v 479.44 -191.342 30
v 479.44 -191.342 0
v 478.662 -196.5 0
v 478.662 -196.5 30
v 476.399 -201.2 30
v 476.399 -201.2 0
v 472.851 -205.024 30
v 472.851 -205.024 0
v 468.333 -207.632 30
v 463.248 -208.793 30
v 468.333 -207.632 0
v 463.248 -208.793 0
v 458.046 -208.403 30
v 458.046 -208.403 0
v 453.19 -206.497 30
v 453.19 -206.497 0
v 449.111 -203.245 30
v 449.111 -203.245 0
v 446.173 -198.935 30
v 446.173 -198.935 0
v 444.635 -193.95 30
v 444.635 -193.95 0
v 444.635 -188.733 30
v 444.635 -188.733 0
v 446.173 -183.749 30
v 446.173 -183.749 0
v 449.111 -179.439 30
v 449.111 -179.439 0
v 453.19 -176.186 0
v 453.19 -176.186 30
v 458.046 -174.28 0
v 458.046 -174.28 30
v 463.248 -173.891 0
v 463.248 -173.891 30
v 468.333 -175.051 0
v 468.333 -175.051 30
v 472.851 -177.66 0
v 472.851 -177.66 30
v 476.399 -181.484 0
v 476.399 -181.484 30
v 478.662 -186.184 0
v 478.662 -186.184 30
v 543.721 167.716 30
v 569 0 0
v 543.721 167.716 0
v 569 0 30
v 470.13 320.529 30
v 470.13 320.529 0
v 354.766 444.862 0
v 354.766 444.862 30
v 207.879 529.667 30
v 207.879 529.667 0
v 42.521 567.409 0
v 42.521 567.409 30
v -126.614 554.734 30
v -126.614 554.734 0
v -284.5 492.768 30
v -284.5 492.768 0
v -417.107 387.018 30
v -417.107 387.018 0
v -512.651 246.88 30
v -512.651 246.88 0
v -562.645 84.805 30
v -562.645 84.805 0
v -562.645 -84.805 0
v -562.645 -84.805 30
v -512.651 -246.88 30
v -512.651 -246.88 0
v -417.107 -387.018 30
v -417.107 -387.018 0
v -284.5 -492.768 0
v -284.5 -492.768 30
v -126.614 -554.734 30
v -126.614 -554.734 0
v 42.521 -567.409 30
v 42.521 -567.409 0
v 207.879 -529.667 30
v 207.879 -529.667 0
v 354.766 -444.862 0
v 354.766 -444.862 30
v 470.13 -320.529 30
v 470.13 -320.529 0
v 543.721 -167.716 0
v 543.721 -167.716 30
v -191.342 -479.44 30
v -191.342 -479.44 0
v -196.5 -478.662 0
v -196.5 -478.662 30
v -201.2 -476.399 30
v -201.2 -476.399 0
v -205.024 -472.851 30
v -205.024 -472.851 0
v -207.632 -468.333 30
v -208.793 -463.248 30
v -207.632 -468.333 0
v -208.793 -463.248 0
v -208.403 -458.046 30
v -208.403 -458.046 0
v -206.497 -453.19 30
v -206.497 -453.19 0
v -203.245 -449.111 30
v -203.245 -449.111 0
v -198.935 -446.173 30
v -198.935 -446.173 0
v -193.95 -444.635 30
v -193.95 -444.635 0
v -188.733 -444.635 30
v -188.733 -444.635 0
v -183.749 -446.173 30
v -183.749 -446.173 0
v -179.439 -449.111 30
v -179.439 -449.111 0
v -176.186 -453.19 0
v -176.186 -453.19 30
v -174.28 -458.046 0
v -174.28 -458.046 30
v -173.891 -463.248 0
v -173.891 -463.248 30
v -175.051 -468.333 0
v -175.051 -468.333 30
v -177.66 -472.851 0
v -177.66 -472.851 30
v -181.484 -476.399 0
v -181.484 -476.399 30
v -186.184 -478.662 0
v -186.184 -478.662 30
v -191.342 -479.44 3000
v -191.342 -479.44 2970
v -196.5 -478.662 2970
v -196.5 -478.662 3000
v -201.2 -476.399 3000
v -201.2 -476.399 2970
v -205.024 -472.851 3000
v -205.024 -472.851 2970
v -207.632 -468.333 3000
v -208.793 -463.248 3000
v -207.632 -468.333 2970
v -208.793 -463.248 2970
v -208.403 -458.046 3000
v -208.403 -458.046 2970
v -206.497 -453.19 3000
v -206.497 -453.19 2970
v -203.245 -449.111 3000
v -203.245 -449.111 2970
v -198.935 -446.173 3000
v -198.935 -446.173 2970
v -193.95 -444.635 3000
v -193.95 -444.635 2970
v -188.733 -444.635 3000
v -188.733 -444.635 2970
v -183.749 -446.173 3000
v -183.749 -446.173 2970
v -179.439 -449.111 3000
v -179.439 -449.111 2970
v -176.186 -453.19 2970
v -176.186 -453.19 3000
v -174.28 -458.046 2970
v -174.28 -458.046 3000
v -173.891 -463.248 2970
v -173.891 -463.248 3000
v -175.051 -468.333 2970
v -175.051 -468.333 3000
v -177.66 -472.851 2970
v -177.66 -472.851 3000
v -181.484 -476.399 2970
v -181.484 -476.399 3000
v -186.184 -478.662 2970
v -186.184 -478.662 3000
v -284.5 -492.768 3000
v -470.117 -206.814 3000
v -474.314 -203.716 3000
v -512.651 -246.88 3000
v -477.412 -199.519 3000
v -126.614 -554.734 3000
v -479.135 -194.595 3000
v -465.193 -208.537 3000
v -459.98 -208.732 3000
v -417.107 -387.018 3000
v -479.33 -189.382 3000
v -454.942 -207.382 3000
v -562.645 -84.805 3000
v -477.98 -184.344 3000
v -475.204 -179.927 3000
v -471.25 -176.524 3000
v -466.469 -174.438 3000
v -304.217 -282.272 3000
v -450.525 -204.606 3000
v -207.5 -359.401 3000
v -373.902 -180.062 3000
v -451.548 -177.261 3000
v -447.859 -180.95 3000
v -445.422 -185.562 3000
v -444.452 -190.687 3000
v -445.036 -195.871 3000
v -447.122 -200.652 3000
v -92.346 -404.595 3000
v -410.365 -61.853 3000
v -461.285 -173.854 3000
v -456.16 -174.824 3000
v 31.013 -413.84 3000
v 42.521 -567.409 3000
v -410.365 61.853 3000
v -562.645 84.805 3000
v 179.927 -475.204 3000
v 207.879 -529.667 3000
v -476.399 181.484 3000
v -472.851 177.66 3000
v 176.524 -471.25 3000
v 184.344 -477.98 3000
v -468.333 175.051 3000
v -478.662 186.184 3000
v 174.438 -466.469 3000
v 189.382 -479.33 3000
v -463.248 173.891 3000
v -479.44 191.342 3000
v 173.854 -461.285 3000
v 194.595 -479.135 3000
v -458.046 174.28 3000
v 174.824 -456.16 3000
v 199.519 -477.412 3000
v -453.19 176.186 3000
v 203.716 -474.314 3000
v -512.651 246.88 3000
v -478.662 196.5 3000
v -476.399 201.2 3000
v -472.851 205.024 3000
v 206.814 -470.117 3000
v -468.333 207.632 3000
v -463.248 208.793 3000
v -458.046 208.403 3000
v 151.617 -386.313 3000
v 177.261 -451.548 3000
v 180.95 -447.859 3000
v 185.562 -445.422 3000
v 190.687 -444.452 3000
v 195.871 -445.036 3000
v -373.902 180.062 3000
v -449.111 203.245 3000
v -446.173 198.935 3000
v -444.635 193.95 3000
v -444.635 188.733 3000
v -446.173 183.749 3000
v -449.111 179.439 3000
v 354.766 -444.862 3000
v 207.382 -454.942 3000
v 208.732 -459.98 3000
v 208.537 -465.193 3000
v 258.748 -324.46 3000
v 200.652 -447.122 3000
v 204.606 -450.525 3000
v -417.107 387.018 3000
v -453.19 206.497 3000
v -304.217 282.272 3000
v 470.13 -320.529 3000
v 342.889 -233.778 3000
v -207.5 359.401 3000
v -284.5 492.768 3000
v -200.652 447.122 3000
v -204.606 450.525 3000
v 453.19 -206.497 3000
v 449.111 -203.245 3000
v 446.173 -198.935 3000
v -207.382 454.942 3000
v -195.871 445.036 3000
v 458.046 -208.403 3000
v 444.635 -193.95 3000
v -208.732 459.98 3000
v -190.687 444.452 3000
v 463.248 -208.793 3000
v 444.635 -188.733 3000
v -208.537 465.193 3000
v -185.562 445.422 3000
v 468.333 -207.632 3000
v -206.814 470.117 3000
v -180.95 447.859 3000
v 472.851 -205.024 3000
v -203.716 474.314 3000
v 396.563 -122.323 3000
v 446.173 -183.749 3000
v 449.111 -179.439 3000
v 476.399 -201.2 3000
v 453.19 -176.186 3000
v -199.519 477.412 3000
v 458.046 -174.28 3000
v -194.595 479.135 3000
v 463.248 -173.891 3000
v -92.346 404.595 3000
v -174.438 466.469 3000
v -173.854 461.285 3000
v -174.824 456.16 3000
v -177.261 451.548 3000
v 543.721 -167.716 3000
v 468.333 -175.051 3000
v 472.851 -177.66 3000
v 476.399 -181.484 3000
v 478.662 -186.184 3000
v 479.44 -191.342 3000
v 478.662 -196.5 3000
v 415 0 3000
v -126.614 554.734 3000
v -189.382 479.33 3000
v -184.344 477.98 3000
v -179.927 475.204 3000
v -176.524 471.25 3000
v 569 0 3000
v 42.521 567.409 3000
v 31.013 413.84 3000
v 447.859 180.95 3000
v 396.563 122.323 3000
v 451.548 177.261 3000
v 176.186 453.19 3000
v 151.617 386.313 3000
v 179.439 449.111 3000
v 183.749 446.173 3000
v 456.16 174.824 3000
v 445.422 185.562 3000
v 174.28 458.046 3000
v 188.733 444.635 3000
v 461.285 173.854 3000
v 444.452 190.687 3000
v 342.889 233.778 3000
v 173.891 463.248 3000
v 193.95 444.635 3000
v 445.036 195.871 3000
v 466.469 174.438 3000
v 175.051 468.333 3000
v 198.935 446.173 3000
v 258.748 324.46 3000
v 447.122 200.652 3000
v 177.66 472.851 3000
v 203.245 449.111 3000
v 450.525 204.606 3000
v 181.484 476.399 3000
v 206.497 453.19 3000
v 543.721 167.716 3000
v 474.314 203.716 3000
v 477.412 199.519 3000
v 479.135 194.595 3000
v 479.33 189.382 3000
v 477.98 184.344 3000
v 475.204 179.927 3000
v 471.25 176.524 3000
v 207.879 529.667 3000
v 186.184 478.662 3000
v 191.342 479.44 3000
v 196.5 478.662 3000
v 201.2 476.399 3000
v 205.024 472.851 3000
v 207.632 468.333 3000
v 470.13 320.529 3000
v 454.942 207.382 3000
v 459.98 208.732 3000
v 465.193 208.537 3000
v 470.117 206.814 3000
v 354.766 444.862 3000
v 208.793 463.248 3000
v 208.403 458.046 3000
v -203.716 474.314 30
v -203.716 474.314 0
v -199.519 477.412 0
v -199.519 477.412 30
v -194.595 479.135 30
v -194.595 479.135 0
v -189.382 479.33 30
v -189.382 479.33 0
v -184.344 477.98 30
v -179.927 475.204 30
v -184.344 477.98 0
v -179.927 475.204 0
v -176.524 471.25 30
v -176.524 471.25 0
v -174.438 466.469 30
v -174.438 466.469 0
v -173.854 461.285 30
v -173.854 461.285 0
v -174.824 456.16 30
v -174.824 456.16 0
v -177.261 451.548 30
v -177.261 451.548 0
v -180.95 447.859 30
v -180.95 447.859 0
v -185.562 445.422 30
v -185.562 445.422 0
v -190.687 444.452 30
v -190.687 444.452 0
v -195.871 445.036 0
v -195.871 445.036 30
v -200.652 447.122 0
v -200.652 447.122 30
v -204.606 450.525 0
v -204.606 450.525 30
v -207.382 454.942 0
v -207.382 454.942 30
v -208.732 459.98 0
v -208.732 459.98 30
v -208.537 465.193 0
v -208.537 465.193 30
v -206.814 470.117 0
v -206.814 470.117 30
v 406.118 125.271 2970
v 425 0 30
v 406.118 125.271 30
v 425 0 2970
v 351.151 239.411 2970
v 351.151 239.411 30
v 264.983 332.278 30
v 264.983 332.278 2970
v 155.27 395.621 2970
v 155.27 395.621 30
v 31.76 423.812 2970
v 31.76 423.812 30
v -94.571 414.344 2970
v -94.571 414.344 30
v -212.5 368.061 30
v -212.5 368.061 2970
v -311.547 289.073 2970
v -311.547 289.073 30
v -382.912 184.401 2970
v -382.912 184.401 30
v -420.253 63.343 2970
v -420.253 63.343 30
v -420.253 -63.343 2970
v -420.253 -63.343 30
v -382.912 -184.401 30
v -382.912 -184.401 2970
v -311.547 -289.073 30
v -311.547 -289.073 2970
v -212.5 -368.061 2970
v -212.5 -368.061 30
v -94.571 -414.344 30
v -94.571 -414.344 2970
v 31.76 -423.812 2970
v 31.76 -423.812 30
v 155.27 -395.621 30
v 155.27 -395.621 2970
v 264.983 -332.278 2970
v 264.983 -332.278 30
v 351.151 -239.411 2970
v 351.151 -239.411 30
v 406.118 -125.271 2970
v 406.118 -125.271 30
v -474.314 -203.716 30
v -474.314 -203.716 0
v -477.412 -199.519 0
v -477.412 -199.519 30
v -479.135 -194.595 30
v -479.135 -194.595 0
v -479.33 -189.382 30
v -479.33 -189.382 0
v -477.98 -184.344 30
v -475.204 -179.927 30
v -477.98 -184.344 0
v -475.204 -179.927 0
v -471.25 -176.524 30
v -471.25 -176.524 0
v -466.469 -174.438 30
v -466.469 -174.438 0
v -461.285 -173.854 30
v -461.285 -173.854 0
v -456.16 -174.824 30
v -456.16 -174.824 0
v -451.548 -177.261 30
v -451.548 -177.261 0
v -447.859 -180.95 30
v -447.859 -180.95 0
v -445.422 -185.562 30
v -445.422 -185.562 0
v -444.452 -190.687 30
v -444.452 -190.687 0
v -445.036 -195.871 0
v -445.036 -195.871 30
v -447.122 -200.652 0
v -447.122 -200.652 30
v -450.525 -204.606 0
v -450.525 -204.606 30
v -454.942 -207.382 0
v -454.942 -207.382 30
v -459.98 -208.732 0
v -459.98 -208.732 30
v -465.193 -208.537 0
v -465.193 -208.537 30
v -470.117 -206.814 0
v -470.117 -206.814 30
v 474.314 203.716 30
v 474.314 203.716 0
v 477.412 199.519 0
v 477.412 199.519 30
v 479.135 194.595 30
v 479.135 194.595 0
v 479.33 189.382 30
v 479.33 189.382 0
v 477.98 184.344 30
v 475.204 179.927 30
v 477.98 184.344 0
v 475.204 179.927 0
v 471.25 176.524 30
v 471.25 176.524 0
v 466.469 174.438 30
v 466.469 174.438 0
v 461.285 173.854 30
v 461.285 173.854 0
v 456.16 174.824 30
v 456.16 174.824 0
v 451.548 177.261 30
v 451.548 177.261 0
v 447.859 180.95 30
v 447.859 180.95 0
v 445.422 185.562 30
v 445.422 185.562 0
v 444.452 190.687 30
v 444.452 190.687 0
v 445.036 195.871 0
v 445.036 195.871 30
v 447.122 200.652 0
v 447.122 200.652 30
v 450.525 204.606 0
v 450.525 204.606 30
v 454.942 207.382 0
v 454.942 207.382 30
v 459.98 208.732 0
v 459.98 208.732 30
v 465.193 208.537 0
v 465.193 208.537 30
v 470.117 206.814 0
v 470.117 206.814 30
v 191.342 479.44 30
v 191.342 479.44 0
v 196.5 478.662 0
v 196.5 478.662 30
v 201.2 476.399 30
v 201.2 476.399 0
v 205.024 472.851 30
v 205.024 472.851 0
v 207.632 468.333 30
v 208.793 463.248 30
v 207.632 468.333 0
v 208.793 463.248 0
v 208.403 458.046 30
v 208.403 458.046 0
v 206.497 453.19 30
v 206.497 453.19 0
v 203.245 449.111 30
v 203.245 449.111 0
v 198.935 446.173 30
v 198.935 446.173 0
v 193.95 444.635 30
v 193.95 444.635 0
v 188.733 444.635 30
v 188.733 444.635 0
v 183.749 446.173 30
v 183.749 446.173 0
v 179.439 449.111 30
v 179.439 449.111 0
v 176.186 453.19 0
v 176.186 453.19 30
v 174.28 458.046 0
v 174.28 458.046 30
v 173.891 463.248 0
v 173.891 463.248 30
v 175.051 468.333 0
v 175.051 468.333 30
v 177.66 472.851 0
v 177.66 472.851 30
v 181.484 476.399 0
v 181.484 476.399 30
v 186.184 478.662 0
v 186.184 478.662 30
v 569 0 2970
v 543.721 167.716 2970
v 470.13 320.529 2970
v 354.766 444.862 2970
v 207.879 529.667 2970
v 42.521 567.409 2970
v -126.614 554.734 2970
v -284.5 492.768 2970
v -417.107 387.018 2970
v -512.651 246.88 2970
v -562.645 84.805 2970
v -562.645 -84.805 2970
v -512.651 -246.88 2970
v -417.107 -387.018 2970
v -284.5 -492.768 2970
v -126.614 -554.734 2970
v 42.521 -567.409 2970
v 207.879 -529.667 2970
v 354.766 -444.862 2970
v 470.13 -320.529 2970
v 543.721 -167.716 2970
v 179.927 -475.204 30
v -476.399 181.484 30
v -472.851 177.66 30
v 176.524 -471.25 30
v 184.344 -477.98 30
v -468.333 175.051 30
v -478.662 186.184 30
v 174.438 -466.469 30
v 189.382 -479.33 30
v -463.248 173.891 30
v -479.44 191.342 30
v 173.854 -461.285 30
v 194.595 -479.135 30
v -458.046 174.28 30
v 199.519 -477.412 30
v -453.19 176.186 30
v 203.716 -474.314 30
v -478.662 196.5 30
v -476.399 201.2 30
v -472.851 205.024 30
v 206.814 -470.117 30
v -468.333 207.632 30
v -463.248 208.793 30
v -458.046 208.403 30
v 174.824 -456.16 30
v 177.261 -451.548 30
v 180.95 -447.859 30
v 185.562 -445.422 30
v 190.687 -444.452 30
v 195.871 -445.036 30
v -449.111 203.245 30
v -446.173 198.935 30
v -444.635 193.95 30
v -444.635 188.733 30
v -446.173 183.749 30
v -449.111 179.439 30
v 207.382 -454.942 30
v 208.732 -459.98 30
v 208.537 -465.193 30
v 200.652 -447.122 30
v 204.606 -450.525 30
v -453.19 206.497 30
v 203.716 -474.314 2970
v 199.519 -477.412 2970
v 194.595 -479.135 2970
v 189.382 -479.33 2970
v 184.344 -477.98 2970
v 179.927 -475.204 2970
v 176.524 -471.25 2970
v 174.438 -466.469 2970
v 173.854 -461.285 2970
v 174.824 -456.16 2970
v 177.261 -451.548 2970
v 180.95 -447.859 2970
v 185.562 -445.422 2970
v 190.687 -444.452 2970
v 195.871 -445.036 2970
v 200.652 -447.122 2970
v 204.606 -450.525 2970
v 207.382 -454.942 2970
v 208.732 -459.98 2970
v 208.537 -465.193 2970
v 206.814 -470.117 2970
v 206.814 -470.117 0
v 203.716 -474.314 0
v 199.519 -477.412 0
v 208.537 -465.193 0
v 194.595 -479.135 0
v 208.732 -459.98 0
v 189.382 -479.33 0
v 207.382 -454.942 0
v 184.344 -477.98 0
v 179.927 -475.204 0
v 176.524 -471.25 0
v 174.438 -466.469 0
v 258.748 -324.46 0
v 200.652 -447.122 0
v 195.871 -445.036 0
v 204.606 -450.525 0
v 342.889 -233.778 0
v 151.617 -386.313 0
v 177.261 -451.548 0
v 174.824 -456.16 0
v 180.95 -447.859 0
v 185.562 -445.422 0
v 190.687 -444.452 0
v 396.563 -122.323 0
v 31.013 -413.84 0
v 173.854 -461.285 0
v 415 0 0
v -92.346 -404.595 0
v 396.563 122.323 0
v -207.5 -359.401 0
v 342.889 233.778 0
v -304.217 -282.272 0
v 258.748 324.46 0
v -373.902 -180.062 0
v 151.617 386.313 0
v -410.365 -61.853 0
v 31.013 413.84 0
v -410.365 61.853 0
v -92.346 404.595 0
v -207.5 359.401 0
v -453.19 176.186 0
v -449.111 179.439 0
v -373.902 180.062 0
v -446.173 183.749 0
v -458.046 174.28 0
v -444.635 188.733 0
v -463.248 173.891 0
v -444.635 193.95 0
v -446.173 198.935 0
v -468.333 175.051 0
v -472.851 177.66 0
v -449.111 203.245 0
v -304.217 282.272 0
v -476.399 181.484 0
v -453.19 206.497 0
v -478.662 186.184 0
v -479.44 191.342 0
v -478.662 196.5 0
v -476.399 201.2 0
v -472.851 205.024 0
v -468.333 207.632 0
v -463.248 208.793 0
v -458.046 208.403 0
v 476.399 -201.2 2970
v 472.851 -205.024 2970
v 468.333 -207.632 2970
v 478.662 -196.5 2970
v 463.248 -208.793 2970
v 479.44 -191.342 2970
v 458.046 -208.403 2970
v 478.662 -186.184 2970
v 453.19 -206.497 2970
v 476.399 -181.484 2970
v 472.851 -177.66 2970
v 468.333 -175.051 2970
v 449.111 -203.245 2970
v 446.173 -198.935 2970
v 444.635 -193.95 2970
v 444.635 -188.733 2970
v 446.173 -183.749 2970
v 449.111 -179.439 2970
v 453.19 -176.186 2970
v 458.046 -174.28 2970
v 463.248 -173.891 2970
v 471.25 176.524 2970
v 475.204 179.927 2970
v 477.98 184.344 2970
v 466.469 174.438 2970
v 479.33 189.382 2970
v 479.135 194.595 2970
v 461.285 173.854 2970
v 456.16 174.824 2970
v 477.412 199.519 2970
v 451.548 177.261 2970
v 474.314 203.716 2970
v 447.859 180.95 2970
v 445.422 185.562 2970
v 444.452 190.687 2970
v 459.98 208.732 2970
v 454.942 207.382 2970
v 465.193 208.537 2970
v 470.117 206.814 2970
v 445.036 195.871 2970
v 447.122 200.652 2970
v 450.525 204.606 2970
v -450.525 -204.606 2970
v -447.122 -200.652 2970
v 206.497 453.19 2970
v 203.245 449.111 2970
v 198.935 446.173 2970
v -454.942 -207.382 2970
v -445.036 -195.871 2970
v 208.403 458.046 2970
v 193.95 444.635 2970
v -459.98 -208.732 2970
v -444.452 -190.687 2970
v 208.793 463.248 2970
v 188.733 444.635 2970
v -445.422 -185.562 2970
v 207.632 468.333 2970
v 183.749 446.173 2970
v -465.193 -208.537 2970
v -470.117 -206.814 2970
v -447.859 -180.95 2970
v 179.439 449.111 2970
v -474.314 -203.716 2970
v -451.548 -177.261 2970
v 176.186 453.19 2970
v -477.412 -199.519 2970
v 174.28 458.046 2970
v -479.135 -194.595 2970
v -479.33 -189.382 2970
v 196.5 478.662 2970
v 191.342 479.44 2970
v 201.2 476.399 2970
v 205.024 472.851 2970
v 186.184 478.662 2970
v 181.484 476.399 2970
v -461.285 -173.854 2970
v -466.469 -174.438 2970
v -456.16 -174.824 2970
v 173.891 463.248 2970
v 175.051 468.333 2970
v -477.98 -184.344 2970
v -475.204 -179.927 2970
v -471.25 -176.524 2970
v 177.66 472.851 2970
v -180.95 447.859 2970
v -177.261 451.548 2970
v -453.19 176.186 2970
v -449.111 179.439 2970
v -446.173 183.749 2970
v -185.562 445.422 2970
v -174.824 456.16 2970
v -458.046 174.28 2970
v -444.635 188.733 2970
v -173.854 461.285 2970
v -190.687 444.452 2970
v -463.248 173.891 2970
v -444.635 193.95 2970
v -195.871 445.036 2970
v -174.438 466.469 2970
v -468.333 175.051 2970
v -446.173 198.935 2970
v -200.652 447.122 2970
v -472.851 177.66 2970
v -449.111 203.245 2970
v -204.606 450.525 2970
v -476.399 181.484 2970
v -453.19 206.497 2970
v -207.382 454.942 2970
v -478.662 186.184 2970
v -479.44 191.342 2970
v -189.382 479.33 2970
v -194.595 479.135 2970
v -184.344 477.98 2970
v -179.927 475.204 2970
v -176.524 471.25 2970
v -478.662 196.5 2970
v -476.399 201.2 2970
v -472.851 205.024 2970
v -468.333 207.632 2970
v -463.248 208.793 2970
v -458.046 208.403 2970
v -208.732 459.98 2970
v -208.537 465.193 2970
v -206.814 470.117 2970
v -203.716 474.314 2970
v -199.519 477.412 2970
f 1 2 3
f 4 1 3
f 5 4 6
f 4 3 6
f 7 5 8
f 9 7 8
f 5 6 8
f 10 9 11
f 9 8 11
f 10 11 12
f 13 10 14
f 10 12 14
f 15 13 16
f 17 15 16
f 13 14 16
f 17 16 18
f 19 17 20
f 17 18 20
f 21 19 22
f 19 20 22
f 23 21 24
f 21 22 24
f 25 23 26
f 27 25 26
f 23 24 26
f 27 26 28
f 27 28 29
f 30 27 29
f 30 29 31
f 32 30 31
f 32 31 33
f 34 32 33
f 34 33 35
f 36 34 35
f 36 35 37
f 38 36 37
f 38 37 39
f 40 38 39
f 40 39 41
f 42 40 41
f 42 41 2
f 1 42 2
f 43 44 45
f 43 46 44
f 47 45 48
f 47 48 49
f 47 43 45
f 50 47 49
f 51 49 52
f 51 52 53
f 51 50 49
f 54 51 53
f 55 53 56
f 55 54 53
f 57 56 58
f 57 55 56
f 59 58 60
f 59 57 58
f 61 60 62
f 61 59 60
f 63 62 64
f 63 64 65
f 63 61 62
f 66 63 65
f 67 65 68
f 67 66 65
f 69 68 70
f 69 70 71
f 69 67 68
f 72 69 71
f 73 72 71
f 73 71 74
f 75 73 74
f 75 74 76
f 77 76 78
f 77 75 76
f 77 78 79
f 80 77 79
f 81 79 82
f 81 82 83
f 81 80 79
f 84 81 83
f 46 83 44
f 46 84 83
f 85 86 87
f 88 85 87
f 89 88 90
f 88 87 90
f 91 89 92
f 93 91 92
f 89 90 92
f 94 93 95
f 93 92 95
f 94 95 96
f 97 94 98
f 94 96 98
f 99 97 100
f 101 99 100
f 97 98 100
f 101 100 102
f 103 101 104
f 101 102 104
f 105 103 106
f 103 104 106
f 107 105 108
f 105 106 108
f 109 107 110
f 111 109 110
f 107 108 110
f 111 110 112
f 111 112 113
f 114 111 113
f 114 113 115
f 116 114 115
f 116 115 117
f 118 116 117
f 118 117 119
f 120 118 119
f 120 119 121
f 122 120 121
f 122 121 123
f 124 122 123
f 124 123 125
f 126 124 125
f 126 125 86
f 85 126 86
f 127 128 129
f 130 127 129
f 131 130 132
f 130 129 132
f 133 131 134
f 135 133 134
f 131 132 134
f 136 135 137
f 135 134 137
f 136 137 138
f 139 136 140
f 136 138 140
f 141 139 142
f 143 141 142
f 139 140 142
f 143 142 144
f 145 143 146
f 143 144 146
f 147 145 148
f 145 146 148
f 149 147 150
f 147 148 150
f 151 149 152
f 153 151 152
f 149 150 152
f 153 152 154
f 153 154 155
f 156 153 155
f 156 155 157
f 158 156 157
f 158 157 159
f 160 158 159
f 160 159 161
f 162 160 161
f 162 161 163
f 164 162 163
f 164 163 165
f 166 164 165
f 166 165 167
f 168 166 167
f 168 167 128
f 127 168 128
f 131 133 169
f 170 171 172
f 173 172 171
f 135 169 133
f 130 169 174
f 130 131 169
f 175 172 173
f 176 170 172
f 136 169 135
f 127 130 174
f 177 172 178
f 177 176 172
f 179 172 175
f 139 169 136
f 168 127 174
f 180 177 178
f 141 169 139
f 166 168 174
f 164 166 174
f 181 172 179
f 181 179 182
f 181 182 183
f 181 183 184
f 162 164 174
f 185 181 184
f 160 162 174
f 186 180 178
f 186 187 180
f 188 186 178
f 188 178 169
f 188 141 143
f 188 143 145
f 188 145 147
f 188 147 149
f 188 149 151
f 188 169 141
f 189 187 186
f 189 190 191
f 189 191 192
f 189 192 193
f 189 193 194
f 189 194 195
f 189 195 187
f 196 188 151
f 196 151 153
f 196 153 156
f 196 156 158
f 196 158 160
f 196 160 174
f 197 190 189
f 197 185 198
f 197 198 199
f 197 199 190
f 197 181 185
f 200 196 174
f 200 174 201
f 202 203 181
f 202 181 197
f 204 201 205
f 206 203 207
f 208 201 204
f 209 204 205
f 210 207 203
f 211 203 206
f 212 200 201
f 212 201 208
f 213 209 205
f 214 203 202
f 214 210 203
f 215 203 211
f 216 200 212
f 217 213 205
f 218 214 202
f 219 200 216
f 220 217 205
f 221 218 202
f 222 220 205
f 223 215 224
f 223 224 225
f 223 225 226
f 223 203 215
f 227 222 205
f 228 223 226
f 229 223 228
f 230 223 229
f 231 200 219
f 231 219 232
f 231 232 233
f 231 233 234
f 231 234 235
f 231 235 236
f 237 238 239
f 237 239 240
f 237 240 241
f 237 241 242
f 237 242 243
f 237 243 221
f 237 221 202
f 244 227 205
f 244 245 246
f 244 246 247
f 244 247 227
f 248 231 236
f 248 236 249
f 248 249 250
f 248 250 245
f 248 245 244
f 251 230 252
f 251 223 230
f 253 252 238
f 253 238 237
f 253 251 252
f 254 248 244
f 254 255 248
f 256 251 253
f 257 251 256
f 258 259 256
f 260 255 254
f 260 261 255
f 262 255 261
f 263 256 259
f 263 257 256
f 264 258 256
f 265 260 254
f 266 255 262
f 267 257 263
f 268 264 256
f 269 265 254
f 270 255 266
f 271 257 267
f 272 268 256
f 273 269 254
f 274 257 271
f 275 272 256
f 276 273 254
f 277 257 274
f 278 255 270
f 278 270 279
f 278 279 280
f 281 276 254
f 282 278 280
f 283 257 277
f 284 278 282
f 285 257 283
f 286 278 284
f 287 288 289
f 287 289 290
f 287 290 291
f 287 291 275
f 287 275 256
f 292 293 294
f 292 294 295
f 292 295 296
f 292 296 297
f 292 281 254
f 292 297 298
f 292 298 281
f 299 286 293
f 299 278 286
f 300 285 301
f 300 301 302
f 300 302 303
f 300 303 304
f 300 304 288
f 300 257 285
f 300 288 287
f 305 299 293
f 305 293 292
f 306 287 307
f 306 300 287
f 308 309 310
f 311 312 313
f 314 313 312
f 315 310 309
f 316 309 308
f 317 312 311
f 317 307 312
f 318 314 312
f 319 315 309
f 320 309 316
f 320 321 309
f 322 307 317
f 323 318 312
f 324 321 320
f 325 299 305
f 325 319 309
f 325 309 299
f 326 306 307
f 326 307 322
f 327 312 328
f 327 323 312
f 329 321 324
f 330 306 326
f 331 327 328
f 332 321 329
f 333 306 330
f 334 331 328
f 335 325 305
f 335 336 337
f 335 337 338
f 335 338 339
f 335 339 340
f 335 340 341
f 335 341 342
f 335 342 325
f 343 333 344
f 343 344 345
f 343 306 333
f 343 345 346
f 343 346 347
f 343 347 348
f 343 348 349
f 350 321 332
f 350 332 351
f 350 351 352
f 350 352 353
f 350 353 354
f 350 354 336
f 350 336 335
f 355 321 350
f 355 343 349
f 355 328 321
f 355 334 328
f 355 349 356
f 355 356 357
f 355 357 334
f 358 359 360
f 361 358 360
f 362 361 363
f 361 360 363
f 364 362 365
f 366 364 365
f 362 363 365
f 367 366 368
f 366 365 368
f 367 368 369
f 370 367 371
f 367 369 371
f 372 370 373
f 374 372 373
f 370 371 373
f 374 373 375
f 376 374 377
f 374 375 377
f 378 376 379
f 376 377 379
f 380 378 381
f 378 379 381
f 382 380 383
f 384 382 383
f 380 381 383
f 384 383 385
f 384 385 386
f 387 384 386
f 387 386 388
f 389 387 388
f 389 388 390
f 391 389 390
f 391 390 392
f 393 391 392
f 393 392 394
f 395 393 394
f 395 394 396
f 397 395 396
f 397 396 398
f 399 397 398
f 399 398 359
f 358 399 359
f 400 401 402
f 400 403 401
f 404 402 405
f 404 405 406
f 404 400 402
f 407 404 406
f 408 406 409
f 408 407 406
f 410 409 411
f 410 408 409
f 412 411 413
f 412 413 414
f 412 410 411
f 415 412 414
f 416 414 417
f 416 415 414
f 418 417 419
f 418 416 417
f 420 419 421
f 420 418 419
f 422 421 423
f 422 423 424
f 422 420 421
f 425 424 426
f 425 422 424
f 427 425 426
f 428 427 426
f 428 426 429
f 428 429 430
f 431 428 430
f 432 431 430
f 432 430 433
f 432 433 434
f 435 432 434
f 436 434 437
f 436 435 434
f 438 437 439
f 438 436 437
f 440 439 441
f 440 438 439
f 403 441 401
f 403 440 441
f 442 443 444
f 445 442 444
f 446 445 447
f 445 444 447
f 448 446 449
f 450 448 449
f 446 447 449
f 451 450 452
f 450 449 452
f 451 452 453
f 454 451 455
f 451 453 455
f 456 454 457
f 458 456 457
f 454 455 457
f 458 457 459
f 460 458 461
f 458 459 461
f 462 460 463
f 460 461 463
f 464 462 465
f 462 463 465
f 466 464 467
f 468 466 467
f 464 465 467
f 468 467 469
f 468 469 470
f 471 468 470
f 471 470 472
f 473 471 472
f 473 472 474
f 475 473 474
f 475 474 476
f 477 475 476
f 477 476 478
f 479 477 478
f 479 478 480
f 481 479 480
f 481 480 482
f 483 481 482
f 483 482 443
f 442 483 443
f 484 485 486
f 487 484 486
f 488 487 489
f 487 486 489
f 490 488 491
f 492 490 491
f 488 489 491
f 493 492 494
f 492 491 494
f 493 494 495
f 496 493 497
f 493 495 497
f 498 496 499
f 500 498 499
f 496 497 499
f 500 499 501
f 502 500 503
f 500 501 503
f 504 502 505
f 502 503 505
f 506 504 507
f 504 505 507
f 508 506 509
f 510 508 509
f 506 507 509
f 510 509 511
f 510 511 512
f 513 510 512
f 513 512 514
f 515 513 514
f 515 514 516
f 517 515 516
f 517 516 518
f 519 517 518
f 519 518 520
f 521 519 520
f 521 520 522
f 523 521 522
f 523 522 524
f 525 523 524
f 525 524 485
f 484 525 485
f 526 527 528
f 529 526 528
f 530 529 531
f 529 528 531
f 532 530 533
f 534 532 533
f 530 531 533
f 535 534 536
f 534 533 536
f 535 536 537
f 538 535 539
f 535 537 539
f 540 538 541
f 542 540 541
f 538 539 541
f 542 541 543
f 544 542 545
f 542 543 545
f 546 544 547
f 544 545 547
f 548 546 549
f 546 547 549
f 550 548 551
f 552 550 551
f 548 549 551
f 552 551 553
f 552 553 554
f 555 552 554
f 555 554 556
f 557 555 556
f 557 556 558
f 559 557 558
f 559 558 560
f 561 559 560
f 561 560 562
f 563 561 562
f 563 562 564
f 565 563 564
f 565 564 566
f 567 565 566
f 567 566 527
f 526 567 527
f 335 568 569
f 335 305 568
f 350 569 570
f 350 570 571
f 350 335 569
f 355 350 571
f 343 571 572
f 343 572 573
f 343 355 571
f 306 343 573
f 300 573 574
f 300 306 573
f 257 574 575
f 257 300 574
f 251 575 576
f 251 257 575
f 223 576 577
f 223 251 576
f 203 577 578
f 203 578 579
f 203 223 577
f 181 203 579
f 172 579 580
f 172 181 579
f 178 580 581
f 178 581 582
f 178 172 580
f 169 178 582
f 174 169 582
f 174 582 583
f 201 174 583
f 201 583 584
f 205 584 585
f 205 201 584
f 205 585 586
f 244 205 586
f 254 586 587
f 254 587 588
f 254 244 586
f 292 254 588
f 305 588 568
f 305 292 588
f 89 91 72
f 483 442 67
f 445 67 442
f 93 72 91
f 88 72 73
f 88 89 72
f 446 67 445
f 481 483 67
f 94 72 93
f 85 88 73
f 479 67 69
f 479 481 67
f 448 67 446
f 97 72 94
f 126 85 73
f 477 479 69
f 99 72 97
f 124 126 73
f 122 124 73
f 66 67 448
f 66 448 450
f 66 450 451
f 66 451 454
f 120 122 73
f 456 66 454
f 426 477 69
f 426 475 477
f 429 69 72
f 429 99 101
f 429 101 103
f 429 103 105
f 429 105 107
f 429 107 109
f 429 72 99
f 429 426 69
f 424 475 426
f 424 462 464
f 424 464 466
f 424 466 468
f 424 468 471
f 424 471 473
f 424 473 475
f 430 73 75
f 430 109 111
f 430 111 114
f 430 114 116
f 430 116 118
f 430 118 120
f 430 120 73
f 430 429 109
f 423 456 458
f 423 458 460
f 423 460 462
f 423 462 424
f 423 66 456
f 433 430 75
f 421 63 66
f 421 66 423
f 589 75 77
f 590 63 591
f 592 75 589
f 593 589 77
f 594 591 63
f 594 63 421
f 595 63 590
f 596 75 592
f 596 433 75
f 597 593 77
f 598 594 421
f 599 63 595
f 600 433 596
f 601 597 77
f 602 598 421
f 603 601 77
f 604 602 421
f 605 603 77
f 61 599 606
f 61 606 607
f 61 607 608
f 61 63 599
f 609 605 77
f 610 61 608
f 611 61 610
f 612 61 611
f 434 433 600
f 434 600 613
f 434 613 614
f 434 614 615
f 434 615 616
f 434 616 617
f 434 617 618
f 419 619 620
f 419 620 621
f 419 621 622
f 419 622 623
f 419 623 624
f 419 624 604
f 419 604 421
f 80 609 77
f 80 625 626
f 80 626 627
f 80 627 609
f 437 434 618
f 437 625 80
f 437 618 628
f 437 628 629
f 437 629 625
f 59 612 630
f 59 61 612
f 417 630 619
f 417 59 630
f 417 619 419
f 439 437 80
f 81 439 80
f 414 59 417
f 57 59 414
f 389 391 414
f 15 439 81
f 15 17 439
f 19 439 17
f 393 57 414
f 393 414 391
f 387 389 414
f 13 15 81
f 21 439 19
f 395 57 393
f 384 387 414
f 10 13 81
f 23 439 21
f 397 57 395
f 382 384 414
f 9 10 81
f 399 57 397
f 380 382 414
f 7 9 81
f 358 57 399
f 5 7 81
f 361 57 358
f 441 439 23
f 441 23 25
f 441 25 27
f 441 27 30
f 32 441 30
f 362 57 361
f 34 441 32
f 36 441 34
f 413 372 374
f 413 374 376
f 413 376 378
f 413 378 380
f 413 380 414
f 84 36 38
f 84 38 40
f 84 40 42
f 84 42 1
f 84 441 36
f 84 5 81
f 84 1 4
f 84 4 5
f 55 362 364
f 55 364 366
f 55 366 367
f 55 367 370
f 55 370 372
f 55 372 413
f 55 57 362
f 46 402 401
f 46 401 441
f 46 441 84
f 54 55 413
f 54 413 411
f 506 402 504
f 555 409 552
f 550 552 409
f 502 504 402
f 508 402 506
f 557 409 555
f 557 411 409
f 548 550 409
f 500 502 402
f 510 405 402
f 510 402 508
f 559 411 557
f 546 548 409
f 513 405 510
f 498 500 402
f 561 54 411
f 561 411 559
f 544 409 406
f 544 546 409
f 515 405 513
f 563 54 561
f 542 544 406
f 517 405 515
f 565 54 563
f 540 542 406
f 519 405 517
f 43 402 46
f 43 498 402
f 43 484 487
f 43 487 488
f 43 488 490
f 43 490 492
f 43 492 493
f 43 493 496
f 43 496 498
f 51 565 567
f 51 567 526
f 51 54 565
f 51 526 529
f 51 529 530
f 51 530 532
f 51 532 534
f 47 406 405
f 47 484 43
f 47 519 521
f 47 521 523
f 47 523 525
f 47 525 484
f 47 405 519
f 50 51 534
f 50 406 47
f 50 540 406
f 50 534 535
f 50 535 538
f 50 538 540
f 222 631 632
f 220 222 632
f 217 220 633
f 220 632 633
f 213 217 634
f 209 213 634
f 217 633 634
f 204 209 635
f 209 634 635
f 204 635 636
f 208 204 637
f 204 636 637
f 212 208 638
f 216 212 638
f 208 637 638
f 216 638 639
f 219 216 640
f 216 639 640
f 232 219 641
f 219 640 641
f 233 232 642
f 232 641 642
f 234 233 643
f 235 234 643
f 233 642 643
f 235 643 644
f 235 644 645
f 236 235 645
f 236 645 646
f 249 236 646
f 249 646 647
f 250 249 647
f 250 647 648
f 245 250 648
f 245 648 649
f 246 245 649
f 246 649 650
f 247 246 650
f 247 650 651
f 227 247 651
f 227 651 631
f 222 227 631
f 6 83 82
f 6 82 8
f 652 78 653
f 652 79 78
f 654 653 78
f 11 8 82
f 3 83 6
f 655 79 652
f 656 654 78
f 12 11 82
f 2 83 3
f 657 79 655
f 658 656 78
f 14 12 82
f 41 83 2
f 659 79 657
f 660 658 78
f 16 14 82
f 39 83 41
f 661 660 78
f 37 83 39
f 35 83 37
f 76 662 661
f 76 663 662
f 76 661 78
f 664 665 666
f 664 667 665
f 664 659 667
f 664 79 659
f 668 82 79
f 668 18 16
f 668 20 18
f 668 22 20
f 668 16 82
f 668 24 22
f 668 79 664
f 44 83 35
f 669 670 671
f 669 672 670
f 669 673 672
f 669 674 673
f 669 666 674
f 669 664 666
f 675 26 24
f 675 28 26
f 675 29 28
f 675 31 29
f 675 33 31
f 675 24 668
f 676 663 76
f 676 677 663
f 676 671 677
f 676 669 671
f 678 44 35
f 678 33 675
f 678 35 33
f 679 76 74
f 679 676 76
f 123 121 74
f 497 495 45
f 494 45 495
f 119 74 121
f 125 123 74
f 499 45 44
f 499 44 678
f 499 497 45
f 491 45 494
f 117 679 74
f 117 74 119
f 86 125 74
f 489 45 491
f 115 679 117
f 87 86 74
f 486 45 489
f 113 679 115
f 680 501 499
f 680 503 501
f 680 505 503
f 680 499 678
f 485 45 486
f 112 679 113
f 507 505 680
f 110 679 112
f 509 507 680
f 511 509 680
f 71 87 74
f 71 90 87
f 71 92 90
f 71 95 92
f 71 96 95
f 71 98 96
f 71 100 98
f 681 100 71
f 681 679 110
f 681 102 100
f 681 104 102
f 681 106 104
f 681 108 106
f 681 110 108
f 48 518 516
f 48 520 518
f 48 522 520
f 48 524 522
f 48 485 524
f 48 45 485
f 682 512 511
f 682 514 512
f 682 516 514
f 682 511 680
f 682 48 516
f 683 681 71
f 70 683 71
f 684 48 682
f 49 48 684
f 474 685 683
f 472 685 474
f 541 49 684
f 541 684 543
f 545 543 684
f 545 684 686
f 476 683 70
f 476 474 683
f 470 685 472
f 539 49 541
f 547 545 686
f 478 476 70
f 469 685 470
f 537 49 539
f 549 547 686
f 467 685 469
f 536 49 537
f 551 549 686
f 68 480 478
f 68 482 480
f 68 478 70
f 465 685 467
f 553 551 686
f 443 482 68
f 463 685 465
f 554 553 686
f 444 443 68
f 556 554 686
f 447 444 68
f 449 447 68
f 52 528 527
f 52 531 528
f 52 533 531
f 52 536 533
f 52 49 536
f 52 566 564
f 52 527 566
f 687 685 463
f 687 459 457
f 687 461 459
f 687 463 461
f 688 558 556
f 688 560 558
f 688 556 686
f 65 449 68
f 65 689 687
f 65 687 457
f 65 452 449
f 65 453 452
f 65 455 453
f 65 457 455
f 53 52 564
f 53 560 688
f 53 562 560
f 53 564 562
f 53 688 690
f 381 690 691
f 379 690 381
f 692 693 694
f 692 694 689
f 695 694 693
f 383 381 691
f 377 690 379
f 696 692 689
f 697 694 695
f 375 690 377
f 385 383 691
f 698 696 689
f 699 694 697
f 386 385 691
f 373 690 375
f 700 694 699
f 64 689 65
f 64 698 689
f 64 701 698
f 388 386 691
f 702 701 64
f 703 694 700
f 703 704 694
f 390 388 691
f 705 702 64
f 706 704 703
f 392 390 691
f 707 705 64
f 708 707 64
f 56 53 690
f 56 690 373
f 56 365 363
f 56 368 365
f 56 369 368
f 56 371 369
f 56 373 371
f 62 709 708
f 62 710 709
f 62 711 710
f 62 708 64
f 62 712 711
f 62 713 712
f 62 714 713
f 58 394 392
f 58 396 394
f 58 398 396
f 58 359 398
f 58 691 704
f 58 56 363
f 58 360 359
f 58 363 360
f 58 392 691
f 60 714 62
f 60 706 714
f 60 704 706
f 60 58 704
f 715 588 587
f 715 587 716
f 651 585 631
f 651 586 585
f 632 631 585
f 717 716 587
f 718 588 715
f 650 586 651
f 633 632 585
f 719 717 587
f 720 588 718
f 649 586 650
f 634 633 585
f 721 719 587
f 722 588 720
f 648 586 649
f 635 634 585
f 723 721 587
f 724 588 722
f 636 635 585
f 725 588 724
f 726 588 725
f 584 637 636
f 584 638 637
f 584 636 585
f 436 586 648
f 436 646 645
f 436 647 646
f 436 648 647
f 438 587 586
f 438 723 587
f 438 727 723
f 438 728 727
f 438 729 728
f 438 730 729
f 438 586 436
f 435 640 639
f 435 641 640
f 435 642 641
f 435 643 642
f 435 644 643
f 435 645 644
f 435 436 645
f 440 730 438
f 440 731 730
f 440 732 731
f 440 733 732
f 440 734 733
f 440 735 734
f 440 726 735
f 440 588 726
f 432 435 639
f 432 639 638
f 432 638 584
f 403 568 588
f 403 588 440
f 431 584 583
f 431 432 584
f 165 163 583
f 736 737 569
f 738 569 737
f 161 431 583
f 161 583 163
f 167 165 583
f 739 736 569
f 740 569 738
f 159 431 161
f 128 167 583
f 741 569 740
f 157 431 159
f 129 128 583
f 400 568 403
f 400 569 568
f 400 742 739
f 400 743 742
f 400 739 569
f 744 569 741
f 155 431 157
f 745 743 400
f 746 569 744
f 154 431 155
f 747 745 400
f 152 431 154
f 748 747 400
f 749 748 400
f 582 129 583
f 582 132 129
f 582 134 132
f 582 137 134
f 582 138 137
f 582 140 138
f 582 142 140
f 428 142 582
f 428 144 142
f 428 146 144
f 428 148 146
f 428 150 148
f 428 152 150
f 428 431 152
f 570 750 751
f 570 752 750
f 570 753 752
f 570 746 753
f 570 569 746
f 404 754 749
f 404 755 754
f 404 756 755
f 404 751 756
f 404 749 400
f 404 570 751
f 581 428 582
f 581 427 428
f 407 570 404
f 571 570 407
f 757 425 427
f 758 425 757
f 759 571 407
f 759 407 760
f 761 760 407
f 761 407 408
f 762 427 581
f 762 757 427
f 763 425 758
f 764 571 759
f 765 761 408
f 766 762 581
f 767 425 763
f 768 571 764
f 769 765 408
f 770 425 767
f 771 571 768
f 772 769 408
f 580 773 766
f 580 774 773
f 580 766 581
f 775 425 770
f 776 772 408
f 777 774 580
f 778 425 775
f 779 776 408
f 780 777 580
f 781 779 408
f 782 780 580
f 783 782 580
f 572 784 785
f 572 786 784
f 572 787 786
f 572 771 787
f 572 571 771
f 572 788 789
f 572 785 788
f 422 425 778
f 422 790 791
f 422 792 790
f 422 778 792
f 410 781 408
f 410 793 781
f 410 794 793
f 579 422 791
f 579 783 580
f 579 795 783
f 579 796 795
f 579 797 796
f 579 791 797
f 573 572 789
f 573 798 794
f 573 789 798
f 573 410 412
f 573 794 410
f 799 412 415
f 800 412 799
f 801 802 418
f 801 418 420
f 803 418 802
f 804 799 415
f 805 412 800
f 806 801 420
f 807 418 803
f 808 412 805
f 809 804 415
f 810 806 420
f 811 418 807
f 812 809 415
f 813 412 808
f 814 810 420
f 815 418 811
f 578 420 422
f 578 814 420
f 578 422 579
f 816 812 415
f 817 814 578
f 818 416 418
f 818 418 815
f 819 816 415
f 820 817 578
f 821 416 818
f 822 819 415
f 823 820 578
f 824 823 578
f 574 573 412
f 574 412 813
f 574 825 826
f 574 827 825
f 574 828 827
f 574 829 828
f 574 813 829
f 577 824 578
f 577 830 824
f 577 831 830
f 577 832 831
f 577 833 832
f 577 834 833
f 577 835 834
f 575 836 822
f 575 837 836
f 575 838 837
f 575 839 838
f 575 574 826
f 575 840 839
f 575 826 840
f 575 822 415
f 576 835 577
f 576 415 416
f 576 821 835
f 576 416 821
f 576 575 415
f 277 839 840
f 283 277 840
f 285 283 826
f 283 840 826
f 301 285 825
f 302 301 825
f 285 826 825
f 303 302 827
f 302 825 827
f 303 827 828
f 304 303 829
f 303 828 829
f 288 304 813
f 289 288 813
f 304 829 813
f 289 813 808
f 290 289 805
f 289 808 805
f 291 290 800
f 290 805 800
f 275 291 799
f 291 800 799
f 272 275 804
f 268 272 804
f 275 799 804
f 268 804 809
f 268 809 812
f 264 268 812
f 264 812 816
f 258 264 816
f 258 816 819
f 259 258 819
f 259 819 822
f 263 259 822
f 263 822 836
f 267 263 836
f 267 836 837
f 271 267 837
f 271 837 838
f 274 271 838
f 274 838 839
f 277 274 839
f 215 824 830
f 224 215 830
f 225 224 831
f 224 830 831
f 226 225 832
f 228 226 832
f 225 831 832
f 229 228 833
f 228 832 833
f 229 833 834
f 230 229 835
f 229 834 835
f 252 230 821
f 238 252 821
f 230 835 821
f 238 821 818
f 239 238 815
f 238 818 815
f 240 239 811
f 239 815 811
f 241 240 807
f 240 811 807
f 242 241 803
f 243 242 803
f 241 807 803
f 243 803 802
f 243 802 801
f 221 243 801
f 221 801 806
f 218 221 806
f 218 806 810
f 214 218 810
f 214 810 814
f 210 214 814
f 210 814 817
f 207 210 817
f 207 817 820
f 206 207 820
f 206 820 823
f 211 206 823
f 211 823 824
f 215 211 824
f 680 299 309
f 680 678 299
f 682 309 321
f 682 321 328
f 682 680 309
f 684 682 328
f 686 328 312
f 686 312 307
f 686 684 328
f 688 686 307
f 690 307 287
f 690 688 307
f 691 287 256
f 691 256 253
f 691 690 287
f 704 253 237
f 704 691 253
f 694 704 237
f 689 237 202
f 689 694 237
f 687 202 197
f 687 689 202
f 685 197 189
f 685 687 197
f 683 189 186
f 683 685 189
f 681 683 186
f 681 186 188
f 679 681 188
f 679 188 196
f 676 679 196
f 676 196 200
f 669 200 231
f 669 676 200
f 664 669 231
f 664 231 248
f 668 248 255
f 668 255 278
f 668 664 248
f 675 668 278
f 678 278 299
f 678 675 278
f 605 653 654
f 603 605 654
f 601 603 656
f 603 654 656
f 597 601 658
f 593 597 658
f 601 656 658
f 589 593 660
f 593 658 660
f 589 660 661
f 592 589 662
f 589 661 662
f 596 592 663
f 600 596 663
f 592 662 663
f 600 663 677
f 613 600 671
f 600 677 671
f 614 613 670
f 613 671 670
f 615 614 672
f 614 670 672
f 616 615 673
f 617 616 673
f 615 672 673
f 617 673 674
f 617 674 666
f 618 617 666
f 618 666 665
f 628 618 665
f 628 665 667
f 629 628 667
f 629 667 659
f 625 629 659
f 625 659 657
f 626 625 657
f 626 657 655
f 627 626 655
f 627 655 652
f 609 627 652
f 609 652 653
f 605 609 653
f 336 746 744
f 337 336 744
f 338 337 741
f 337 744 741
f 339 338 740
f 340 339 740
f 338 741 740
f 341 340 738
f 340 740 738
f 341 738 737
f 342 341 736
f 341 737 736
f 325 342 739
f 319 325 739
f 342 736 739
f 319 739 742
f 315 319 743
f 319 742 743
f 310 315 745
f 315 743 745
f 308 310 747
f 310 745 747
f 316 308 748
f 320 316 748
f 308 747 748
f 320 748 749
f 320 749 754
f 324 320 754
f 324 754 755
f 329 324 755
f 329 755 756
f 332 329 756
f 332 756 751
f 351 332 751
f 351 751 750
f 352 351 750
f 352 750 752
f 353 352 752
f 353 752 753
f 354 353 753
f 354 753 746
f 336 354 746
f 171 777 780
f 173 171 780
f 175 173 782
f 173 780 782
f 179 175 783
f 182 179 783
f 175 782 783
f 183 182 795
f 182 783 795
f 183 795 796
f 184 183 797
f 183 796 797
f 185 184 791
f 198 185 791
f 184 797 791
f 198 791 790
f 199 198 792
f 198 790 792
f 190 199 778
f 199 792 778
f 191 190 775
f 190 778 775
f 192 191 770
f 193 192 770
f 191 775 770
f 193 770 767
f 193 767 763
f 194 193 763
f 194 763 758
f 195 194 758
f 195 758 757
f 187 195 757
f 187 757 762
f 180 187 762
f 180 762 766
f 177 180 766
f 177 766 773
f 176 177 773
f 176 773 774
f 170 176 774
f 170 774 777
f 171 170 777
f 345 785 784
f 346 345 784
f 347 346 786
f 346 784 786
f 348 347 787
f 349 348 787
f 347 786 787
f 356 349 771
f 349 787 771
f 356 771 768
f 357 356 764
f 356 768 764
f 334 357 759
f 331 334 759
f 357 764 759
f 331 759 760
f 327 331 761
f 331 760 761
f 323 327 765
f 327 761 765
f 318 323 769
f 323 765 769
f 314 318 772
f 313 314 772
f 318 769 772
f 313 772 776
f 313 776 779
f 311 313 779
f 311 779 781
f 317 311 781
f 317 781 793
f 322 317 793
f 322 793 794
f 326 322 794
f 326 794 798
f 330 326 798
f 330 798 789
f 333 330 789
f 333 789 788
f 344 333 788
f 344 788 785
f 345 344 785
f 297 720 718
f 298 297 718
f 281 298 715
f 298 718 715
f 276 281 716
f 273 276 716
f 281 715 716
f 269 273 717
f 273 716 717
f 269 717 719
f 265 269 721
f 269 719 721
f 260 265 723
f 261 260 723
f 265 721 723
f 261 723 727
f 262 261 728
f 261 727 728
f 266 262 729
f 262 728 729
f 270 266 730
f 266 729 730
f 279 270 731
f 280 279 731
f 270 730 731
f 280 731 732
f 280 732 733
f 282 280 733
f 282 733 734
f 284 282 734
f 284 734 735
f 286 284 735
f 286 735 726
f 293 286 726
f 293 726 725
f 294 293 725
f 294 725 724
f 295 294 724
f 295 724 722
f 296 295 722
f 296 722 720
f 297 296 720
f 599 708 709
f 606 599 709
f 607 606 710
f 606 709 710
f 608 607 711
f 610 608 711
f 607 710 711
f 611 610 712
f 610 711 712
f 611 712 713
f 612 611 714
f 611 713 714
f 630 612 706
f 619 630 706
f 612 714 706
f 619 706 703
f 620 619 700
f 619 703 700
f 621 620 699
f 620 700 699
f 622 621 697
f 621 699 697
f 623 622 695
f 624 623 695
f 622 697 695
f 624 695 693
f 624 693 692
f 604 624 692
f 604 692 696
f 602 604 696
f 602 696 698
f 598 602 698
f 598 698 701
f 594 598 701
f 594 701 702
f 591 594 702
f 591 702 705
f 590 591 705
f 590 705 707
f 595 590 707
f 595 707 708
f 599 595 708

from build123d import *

# Parameters (mm, degrees)
SKETCH009_R      = 17.5
EXTRUDE004_DEPTH = 3000
ARRAY003_COUNT   = 8


with BuildPart() as array003:
    # Sketch009 (on Face8 of Revolve) → Extrude004 (new body)
    with BuildSketch(Plane(origin=(0, 0, 0), x_dir=(1, 0, 0), z_dir=(0, 0, -1))):
        with Locations((461.939766, 191.341716)):
            Circle(SKETCH009_R)
    extrude(amount=-EXTRUDE004_DEPTH)

    # Array003: Array003 ×8 about axis
    array003_axis = Axis((0, 0, 0), (0, 0, 1))


with BuildPart() as array003_1:
    add(array003.part)
    for i in range(1, ARRAY003_COUNT):
        add(array003.part.rotate(array003_axis, i * 360 / ARRAY003_COUNT))


with BuildPart() as bottom001:
    # Sketch → Revolve (revolve)
    with BuildSketch(Plane.XZ):
        Polygon((569, 0), (569, 30), (425, 30), (425, 2970), (569, 2970), (569, 3000), (415, 3000), (415, 0), align=None)
    revolve(axis=Axis((0, 0, 0), (0, 0, 1)))

    # Cut003: cut Array003
    add(array003_1.part, mode=Mode.SUBTRACT)


solid = bottom001.part
